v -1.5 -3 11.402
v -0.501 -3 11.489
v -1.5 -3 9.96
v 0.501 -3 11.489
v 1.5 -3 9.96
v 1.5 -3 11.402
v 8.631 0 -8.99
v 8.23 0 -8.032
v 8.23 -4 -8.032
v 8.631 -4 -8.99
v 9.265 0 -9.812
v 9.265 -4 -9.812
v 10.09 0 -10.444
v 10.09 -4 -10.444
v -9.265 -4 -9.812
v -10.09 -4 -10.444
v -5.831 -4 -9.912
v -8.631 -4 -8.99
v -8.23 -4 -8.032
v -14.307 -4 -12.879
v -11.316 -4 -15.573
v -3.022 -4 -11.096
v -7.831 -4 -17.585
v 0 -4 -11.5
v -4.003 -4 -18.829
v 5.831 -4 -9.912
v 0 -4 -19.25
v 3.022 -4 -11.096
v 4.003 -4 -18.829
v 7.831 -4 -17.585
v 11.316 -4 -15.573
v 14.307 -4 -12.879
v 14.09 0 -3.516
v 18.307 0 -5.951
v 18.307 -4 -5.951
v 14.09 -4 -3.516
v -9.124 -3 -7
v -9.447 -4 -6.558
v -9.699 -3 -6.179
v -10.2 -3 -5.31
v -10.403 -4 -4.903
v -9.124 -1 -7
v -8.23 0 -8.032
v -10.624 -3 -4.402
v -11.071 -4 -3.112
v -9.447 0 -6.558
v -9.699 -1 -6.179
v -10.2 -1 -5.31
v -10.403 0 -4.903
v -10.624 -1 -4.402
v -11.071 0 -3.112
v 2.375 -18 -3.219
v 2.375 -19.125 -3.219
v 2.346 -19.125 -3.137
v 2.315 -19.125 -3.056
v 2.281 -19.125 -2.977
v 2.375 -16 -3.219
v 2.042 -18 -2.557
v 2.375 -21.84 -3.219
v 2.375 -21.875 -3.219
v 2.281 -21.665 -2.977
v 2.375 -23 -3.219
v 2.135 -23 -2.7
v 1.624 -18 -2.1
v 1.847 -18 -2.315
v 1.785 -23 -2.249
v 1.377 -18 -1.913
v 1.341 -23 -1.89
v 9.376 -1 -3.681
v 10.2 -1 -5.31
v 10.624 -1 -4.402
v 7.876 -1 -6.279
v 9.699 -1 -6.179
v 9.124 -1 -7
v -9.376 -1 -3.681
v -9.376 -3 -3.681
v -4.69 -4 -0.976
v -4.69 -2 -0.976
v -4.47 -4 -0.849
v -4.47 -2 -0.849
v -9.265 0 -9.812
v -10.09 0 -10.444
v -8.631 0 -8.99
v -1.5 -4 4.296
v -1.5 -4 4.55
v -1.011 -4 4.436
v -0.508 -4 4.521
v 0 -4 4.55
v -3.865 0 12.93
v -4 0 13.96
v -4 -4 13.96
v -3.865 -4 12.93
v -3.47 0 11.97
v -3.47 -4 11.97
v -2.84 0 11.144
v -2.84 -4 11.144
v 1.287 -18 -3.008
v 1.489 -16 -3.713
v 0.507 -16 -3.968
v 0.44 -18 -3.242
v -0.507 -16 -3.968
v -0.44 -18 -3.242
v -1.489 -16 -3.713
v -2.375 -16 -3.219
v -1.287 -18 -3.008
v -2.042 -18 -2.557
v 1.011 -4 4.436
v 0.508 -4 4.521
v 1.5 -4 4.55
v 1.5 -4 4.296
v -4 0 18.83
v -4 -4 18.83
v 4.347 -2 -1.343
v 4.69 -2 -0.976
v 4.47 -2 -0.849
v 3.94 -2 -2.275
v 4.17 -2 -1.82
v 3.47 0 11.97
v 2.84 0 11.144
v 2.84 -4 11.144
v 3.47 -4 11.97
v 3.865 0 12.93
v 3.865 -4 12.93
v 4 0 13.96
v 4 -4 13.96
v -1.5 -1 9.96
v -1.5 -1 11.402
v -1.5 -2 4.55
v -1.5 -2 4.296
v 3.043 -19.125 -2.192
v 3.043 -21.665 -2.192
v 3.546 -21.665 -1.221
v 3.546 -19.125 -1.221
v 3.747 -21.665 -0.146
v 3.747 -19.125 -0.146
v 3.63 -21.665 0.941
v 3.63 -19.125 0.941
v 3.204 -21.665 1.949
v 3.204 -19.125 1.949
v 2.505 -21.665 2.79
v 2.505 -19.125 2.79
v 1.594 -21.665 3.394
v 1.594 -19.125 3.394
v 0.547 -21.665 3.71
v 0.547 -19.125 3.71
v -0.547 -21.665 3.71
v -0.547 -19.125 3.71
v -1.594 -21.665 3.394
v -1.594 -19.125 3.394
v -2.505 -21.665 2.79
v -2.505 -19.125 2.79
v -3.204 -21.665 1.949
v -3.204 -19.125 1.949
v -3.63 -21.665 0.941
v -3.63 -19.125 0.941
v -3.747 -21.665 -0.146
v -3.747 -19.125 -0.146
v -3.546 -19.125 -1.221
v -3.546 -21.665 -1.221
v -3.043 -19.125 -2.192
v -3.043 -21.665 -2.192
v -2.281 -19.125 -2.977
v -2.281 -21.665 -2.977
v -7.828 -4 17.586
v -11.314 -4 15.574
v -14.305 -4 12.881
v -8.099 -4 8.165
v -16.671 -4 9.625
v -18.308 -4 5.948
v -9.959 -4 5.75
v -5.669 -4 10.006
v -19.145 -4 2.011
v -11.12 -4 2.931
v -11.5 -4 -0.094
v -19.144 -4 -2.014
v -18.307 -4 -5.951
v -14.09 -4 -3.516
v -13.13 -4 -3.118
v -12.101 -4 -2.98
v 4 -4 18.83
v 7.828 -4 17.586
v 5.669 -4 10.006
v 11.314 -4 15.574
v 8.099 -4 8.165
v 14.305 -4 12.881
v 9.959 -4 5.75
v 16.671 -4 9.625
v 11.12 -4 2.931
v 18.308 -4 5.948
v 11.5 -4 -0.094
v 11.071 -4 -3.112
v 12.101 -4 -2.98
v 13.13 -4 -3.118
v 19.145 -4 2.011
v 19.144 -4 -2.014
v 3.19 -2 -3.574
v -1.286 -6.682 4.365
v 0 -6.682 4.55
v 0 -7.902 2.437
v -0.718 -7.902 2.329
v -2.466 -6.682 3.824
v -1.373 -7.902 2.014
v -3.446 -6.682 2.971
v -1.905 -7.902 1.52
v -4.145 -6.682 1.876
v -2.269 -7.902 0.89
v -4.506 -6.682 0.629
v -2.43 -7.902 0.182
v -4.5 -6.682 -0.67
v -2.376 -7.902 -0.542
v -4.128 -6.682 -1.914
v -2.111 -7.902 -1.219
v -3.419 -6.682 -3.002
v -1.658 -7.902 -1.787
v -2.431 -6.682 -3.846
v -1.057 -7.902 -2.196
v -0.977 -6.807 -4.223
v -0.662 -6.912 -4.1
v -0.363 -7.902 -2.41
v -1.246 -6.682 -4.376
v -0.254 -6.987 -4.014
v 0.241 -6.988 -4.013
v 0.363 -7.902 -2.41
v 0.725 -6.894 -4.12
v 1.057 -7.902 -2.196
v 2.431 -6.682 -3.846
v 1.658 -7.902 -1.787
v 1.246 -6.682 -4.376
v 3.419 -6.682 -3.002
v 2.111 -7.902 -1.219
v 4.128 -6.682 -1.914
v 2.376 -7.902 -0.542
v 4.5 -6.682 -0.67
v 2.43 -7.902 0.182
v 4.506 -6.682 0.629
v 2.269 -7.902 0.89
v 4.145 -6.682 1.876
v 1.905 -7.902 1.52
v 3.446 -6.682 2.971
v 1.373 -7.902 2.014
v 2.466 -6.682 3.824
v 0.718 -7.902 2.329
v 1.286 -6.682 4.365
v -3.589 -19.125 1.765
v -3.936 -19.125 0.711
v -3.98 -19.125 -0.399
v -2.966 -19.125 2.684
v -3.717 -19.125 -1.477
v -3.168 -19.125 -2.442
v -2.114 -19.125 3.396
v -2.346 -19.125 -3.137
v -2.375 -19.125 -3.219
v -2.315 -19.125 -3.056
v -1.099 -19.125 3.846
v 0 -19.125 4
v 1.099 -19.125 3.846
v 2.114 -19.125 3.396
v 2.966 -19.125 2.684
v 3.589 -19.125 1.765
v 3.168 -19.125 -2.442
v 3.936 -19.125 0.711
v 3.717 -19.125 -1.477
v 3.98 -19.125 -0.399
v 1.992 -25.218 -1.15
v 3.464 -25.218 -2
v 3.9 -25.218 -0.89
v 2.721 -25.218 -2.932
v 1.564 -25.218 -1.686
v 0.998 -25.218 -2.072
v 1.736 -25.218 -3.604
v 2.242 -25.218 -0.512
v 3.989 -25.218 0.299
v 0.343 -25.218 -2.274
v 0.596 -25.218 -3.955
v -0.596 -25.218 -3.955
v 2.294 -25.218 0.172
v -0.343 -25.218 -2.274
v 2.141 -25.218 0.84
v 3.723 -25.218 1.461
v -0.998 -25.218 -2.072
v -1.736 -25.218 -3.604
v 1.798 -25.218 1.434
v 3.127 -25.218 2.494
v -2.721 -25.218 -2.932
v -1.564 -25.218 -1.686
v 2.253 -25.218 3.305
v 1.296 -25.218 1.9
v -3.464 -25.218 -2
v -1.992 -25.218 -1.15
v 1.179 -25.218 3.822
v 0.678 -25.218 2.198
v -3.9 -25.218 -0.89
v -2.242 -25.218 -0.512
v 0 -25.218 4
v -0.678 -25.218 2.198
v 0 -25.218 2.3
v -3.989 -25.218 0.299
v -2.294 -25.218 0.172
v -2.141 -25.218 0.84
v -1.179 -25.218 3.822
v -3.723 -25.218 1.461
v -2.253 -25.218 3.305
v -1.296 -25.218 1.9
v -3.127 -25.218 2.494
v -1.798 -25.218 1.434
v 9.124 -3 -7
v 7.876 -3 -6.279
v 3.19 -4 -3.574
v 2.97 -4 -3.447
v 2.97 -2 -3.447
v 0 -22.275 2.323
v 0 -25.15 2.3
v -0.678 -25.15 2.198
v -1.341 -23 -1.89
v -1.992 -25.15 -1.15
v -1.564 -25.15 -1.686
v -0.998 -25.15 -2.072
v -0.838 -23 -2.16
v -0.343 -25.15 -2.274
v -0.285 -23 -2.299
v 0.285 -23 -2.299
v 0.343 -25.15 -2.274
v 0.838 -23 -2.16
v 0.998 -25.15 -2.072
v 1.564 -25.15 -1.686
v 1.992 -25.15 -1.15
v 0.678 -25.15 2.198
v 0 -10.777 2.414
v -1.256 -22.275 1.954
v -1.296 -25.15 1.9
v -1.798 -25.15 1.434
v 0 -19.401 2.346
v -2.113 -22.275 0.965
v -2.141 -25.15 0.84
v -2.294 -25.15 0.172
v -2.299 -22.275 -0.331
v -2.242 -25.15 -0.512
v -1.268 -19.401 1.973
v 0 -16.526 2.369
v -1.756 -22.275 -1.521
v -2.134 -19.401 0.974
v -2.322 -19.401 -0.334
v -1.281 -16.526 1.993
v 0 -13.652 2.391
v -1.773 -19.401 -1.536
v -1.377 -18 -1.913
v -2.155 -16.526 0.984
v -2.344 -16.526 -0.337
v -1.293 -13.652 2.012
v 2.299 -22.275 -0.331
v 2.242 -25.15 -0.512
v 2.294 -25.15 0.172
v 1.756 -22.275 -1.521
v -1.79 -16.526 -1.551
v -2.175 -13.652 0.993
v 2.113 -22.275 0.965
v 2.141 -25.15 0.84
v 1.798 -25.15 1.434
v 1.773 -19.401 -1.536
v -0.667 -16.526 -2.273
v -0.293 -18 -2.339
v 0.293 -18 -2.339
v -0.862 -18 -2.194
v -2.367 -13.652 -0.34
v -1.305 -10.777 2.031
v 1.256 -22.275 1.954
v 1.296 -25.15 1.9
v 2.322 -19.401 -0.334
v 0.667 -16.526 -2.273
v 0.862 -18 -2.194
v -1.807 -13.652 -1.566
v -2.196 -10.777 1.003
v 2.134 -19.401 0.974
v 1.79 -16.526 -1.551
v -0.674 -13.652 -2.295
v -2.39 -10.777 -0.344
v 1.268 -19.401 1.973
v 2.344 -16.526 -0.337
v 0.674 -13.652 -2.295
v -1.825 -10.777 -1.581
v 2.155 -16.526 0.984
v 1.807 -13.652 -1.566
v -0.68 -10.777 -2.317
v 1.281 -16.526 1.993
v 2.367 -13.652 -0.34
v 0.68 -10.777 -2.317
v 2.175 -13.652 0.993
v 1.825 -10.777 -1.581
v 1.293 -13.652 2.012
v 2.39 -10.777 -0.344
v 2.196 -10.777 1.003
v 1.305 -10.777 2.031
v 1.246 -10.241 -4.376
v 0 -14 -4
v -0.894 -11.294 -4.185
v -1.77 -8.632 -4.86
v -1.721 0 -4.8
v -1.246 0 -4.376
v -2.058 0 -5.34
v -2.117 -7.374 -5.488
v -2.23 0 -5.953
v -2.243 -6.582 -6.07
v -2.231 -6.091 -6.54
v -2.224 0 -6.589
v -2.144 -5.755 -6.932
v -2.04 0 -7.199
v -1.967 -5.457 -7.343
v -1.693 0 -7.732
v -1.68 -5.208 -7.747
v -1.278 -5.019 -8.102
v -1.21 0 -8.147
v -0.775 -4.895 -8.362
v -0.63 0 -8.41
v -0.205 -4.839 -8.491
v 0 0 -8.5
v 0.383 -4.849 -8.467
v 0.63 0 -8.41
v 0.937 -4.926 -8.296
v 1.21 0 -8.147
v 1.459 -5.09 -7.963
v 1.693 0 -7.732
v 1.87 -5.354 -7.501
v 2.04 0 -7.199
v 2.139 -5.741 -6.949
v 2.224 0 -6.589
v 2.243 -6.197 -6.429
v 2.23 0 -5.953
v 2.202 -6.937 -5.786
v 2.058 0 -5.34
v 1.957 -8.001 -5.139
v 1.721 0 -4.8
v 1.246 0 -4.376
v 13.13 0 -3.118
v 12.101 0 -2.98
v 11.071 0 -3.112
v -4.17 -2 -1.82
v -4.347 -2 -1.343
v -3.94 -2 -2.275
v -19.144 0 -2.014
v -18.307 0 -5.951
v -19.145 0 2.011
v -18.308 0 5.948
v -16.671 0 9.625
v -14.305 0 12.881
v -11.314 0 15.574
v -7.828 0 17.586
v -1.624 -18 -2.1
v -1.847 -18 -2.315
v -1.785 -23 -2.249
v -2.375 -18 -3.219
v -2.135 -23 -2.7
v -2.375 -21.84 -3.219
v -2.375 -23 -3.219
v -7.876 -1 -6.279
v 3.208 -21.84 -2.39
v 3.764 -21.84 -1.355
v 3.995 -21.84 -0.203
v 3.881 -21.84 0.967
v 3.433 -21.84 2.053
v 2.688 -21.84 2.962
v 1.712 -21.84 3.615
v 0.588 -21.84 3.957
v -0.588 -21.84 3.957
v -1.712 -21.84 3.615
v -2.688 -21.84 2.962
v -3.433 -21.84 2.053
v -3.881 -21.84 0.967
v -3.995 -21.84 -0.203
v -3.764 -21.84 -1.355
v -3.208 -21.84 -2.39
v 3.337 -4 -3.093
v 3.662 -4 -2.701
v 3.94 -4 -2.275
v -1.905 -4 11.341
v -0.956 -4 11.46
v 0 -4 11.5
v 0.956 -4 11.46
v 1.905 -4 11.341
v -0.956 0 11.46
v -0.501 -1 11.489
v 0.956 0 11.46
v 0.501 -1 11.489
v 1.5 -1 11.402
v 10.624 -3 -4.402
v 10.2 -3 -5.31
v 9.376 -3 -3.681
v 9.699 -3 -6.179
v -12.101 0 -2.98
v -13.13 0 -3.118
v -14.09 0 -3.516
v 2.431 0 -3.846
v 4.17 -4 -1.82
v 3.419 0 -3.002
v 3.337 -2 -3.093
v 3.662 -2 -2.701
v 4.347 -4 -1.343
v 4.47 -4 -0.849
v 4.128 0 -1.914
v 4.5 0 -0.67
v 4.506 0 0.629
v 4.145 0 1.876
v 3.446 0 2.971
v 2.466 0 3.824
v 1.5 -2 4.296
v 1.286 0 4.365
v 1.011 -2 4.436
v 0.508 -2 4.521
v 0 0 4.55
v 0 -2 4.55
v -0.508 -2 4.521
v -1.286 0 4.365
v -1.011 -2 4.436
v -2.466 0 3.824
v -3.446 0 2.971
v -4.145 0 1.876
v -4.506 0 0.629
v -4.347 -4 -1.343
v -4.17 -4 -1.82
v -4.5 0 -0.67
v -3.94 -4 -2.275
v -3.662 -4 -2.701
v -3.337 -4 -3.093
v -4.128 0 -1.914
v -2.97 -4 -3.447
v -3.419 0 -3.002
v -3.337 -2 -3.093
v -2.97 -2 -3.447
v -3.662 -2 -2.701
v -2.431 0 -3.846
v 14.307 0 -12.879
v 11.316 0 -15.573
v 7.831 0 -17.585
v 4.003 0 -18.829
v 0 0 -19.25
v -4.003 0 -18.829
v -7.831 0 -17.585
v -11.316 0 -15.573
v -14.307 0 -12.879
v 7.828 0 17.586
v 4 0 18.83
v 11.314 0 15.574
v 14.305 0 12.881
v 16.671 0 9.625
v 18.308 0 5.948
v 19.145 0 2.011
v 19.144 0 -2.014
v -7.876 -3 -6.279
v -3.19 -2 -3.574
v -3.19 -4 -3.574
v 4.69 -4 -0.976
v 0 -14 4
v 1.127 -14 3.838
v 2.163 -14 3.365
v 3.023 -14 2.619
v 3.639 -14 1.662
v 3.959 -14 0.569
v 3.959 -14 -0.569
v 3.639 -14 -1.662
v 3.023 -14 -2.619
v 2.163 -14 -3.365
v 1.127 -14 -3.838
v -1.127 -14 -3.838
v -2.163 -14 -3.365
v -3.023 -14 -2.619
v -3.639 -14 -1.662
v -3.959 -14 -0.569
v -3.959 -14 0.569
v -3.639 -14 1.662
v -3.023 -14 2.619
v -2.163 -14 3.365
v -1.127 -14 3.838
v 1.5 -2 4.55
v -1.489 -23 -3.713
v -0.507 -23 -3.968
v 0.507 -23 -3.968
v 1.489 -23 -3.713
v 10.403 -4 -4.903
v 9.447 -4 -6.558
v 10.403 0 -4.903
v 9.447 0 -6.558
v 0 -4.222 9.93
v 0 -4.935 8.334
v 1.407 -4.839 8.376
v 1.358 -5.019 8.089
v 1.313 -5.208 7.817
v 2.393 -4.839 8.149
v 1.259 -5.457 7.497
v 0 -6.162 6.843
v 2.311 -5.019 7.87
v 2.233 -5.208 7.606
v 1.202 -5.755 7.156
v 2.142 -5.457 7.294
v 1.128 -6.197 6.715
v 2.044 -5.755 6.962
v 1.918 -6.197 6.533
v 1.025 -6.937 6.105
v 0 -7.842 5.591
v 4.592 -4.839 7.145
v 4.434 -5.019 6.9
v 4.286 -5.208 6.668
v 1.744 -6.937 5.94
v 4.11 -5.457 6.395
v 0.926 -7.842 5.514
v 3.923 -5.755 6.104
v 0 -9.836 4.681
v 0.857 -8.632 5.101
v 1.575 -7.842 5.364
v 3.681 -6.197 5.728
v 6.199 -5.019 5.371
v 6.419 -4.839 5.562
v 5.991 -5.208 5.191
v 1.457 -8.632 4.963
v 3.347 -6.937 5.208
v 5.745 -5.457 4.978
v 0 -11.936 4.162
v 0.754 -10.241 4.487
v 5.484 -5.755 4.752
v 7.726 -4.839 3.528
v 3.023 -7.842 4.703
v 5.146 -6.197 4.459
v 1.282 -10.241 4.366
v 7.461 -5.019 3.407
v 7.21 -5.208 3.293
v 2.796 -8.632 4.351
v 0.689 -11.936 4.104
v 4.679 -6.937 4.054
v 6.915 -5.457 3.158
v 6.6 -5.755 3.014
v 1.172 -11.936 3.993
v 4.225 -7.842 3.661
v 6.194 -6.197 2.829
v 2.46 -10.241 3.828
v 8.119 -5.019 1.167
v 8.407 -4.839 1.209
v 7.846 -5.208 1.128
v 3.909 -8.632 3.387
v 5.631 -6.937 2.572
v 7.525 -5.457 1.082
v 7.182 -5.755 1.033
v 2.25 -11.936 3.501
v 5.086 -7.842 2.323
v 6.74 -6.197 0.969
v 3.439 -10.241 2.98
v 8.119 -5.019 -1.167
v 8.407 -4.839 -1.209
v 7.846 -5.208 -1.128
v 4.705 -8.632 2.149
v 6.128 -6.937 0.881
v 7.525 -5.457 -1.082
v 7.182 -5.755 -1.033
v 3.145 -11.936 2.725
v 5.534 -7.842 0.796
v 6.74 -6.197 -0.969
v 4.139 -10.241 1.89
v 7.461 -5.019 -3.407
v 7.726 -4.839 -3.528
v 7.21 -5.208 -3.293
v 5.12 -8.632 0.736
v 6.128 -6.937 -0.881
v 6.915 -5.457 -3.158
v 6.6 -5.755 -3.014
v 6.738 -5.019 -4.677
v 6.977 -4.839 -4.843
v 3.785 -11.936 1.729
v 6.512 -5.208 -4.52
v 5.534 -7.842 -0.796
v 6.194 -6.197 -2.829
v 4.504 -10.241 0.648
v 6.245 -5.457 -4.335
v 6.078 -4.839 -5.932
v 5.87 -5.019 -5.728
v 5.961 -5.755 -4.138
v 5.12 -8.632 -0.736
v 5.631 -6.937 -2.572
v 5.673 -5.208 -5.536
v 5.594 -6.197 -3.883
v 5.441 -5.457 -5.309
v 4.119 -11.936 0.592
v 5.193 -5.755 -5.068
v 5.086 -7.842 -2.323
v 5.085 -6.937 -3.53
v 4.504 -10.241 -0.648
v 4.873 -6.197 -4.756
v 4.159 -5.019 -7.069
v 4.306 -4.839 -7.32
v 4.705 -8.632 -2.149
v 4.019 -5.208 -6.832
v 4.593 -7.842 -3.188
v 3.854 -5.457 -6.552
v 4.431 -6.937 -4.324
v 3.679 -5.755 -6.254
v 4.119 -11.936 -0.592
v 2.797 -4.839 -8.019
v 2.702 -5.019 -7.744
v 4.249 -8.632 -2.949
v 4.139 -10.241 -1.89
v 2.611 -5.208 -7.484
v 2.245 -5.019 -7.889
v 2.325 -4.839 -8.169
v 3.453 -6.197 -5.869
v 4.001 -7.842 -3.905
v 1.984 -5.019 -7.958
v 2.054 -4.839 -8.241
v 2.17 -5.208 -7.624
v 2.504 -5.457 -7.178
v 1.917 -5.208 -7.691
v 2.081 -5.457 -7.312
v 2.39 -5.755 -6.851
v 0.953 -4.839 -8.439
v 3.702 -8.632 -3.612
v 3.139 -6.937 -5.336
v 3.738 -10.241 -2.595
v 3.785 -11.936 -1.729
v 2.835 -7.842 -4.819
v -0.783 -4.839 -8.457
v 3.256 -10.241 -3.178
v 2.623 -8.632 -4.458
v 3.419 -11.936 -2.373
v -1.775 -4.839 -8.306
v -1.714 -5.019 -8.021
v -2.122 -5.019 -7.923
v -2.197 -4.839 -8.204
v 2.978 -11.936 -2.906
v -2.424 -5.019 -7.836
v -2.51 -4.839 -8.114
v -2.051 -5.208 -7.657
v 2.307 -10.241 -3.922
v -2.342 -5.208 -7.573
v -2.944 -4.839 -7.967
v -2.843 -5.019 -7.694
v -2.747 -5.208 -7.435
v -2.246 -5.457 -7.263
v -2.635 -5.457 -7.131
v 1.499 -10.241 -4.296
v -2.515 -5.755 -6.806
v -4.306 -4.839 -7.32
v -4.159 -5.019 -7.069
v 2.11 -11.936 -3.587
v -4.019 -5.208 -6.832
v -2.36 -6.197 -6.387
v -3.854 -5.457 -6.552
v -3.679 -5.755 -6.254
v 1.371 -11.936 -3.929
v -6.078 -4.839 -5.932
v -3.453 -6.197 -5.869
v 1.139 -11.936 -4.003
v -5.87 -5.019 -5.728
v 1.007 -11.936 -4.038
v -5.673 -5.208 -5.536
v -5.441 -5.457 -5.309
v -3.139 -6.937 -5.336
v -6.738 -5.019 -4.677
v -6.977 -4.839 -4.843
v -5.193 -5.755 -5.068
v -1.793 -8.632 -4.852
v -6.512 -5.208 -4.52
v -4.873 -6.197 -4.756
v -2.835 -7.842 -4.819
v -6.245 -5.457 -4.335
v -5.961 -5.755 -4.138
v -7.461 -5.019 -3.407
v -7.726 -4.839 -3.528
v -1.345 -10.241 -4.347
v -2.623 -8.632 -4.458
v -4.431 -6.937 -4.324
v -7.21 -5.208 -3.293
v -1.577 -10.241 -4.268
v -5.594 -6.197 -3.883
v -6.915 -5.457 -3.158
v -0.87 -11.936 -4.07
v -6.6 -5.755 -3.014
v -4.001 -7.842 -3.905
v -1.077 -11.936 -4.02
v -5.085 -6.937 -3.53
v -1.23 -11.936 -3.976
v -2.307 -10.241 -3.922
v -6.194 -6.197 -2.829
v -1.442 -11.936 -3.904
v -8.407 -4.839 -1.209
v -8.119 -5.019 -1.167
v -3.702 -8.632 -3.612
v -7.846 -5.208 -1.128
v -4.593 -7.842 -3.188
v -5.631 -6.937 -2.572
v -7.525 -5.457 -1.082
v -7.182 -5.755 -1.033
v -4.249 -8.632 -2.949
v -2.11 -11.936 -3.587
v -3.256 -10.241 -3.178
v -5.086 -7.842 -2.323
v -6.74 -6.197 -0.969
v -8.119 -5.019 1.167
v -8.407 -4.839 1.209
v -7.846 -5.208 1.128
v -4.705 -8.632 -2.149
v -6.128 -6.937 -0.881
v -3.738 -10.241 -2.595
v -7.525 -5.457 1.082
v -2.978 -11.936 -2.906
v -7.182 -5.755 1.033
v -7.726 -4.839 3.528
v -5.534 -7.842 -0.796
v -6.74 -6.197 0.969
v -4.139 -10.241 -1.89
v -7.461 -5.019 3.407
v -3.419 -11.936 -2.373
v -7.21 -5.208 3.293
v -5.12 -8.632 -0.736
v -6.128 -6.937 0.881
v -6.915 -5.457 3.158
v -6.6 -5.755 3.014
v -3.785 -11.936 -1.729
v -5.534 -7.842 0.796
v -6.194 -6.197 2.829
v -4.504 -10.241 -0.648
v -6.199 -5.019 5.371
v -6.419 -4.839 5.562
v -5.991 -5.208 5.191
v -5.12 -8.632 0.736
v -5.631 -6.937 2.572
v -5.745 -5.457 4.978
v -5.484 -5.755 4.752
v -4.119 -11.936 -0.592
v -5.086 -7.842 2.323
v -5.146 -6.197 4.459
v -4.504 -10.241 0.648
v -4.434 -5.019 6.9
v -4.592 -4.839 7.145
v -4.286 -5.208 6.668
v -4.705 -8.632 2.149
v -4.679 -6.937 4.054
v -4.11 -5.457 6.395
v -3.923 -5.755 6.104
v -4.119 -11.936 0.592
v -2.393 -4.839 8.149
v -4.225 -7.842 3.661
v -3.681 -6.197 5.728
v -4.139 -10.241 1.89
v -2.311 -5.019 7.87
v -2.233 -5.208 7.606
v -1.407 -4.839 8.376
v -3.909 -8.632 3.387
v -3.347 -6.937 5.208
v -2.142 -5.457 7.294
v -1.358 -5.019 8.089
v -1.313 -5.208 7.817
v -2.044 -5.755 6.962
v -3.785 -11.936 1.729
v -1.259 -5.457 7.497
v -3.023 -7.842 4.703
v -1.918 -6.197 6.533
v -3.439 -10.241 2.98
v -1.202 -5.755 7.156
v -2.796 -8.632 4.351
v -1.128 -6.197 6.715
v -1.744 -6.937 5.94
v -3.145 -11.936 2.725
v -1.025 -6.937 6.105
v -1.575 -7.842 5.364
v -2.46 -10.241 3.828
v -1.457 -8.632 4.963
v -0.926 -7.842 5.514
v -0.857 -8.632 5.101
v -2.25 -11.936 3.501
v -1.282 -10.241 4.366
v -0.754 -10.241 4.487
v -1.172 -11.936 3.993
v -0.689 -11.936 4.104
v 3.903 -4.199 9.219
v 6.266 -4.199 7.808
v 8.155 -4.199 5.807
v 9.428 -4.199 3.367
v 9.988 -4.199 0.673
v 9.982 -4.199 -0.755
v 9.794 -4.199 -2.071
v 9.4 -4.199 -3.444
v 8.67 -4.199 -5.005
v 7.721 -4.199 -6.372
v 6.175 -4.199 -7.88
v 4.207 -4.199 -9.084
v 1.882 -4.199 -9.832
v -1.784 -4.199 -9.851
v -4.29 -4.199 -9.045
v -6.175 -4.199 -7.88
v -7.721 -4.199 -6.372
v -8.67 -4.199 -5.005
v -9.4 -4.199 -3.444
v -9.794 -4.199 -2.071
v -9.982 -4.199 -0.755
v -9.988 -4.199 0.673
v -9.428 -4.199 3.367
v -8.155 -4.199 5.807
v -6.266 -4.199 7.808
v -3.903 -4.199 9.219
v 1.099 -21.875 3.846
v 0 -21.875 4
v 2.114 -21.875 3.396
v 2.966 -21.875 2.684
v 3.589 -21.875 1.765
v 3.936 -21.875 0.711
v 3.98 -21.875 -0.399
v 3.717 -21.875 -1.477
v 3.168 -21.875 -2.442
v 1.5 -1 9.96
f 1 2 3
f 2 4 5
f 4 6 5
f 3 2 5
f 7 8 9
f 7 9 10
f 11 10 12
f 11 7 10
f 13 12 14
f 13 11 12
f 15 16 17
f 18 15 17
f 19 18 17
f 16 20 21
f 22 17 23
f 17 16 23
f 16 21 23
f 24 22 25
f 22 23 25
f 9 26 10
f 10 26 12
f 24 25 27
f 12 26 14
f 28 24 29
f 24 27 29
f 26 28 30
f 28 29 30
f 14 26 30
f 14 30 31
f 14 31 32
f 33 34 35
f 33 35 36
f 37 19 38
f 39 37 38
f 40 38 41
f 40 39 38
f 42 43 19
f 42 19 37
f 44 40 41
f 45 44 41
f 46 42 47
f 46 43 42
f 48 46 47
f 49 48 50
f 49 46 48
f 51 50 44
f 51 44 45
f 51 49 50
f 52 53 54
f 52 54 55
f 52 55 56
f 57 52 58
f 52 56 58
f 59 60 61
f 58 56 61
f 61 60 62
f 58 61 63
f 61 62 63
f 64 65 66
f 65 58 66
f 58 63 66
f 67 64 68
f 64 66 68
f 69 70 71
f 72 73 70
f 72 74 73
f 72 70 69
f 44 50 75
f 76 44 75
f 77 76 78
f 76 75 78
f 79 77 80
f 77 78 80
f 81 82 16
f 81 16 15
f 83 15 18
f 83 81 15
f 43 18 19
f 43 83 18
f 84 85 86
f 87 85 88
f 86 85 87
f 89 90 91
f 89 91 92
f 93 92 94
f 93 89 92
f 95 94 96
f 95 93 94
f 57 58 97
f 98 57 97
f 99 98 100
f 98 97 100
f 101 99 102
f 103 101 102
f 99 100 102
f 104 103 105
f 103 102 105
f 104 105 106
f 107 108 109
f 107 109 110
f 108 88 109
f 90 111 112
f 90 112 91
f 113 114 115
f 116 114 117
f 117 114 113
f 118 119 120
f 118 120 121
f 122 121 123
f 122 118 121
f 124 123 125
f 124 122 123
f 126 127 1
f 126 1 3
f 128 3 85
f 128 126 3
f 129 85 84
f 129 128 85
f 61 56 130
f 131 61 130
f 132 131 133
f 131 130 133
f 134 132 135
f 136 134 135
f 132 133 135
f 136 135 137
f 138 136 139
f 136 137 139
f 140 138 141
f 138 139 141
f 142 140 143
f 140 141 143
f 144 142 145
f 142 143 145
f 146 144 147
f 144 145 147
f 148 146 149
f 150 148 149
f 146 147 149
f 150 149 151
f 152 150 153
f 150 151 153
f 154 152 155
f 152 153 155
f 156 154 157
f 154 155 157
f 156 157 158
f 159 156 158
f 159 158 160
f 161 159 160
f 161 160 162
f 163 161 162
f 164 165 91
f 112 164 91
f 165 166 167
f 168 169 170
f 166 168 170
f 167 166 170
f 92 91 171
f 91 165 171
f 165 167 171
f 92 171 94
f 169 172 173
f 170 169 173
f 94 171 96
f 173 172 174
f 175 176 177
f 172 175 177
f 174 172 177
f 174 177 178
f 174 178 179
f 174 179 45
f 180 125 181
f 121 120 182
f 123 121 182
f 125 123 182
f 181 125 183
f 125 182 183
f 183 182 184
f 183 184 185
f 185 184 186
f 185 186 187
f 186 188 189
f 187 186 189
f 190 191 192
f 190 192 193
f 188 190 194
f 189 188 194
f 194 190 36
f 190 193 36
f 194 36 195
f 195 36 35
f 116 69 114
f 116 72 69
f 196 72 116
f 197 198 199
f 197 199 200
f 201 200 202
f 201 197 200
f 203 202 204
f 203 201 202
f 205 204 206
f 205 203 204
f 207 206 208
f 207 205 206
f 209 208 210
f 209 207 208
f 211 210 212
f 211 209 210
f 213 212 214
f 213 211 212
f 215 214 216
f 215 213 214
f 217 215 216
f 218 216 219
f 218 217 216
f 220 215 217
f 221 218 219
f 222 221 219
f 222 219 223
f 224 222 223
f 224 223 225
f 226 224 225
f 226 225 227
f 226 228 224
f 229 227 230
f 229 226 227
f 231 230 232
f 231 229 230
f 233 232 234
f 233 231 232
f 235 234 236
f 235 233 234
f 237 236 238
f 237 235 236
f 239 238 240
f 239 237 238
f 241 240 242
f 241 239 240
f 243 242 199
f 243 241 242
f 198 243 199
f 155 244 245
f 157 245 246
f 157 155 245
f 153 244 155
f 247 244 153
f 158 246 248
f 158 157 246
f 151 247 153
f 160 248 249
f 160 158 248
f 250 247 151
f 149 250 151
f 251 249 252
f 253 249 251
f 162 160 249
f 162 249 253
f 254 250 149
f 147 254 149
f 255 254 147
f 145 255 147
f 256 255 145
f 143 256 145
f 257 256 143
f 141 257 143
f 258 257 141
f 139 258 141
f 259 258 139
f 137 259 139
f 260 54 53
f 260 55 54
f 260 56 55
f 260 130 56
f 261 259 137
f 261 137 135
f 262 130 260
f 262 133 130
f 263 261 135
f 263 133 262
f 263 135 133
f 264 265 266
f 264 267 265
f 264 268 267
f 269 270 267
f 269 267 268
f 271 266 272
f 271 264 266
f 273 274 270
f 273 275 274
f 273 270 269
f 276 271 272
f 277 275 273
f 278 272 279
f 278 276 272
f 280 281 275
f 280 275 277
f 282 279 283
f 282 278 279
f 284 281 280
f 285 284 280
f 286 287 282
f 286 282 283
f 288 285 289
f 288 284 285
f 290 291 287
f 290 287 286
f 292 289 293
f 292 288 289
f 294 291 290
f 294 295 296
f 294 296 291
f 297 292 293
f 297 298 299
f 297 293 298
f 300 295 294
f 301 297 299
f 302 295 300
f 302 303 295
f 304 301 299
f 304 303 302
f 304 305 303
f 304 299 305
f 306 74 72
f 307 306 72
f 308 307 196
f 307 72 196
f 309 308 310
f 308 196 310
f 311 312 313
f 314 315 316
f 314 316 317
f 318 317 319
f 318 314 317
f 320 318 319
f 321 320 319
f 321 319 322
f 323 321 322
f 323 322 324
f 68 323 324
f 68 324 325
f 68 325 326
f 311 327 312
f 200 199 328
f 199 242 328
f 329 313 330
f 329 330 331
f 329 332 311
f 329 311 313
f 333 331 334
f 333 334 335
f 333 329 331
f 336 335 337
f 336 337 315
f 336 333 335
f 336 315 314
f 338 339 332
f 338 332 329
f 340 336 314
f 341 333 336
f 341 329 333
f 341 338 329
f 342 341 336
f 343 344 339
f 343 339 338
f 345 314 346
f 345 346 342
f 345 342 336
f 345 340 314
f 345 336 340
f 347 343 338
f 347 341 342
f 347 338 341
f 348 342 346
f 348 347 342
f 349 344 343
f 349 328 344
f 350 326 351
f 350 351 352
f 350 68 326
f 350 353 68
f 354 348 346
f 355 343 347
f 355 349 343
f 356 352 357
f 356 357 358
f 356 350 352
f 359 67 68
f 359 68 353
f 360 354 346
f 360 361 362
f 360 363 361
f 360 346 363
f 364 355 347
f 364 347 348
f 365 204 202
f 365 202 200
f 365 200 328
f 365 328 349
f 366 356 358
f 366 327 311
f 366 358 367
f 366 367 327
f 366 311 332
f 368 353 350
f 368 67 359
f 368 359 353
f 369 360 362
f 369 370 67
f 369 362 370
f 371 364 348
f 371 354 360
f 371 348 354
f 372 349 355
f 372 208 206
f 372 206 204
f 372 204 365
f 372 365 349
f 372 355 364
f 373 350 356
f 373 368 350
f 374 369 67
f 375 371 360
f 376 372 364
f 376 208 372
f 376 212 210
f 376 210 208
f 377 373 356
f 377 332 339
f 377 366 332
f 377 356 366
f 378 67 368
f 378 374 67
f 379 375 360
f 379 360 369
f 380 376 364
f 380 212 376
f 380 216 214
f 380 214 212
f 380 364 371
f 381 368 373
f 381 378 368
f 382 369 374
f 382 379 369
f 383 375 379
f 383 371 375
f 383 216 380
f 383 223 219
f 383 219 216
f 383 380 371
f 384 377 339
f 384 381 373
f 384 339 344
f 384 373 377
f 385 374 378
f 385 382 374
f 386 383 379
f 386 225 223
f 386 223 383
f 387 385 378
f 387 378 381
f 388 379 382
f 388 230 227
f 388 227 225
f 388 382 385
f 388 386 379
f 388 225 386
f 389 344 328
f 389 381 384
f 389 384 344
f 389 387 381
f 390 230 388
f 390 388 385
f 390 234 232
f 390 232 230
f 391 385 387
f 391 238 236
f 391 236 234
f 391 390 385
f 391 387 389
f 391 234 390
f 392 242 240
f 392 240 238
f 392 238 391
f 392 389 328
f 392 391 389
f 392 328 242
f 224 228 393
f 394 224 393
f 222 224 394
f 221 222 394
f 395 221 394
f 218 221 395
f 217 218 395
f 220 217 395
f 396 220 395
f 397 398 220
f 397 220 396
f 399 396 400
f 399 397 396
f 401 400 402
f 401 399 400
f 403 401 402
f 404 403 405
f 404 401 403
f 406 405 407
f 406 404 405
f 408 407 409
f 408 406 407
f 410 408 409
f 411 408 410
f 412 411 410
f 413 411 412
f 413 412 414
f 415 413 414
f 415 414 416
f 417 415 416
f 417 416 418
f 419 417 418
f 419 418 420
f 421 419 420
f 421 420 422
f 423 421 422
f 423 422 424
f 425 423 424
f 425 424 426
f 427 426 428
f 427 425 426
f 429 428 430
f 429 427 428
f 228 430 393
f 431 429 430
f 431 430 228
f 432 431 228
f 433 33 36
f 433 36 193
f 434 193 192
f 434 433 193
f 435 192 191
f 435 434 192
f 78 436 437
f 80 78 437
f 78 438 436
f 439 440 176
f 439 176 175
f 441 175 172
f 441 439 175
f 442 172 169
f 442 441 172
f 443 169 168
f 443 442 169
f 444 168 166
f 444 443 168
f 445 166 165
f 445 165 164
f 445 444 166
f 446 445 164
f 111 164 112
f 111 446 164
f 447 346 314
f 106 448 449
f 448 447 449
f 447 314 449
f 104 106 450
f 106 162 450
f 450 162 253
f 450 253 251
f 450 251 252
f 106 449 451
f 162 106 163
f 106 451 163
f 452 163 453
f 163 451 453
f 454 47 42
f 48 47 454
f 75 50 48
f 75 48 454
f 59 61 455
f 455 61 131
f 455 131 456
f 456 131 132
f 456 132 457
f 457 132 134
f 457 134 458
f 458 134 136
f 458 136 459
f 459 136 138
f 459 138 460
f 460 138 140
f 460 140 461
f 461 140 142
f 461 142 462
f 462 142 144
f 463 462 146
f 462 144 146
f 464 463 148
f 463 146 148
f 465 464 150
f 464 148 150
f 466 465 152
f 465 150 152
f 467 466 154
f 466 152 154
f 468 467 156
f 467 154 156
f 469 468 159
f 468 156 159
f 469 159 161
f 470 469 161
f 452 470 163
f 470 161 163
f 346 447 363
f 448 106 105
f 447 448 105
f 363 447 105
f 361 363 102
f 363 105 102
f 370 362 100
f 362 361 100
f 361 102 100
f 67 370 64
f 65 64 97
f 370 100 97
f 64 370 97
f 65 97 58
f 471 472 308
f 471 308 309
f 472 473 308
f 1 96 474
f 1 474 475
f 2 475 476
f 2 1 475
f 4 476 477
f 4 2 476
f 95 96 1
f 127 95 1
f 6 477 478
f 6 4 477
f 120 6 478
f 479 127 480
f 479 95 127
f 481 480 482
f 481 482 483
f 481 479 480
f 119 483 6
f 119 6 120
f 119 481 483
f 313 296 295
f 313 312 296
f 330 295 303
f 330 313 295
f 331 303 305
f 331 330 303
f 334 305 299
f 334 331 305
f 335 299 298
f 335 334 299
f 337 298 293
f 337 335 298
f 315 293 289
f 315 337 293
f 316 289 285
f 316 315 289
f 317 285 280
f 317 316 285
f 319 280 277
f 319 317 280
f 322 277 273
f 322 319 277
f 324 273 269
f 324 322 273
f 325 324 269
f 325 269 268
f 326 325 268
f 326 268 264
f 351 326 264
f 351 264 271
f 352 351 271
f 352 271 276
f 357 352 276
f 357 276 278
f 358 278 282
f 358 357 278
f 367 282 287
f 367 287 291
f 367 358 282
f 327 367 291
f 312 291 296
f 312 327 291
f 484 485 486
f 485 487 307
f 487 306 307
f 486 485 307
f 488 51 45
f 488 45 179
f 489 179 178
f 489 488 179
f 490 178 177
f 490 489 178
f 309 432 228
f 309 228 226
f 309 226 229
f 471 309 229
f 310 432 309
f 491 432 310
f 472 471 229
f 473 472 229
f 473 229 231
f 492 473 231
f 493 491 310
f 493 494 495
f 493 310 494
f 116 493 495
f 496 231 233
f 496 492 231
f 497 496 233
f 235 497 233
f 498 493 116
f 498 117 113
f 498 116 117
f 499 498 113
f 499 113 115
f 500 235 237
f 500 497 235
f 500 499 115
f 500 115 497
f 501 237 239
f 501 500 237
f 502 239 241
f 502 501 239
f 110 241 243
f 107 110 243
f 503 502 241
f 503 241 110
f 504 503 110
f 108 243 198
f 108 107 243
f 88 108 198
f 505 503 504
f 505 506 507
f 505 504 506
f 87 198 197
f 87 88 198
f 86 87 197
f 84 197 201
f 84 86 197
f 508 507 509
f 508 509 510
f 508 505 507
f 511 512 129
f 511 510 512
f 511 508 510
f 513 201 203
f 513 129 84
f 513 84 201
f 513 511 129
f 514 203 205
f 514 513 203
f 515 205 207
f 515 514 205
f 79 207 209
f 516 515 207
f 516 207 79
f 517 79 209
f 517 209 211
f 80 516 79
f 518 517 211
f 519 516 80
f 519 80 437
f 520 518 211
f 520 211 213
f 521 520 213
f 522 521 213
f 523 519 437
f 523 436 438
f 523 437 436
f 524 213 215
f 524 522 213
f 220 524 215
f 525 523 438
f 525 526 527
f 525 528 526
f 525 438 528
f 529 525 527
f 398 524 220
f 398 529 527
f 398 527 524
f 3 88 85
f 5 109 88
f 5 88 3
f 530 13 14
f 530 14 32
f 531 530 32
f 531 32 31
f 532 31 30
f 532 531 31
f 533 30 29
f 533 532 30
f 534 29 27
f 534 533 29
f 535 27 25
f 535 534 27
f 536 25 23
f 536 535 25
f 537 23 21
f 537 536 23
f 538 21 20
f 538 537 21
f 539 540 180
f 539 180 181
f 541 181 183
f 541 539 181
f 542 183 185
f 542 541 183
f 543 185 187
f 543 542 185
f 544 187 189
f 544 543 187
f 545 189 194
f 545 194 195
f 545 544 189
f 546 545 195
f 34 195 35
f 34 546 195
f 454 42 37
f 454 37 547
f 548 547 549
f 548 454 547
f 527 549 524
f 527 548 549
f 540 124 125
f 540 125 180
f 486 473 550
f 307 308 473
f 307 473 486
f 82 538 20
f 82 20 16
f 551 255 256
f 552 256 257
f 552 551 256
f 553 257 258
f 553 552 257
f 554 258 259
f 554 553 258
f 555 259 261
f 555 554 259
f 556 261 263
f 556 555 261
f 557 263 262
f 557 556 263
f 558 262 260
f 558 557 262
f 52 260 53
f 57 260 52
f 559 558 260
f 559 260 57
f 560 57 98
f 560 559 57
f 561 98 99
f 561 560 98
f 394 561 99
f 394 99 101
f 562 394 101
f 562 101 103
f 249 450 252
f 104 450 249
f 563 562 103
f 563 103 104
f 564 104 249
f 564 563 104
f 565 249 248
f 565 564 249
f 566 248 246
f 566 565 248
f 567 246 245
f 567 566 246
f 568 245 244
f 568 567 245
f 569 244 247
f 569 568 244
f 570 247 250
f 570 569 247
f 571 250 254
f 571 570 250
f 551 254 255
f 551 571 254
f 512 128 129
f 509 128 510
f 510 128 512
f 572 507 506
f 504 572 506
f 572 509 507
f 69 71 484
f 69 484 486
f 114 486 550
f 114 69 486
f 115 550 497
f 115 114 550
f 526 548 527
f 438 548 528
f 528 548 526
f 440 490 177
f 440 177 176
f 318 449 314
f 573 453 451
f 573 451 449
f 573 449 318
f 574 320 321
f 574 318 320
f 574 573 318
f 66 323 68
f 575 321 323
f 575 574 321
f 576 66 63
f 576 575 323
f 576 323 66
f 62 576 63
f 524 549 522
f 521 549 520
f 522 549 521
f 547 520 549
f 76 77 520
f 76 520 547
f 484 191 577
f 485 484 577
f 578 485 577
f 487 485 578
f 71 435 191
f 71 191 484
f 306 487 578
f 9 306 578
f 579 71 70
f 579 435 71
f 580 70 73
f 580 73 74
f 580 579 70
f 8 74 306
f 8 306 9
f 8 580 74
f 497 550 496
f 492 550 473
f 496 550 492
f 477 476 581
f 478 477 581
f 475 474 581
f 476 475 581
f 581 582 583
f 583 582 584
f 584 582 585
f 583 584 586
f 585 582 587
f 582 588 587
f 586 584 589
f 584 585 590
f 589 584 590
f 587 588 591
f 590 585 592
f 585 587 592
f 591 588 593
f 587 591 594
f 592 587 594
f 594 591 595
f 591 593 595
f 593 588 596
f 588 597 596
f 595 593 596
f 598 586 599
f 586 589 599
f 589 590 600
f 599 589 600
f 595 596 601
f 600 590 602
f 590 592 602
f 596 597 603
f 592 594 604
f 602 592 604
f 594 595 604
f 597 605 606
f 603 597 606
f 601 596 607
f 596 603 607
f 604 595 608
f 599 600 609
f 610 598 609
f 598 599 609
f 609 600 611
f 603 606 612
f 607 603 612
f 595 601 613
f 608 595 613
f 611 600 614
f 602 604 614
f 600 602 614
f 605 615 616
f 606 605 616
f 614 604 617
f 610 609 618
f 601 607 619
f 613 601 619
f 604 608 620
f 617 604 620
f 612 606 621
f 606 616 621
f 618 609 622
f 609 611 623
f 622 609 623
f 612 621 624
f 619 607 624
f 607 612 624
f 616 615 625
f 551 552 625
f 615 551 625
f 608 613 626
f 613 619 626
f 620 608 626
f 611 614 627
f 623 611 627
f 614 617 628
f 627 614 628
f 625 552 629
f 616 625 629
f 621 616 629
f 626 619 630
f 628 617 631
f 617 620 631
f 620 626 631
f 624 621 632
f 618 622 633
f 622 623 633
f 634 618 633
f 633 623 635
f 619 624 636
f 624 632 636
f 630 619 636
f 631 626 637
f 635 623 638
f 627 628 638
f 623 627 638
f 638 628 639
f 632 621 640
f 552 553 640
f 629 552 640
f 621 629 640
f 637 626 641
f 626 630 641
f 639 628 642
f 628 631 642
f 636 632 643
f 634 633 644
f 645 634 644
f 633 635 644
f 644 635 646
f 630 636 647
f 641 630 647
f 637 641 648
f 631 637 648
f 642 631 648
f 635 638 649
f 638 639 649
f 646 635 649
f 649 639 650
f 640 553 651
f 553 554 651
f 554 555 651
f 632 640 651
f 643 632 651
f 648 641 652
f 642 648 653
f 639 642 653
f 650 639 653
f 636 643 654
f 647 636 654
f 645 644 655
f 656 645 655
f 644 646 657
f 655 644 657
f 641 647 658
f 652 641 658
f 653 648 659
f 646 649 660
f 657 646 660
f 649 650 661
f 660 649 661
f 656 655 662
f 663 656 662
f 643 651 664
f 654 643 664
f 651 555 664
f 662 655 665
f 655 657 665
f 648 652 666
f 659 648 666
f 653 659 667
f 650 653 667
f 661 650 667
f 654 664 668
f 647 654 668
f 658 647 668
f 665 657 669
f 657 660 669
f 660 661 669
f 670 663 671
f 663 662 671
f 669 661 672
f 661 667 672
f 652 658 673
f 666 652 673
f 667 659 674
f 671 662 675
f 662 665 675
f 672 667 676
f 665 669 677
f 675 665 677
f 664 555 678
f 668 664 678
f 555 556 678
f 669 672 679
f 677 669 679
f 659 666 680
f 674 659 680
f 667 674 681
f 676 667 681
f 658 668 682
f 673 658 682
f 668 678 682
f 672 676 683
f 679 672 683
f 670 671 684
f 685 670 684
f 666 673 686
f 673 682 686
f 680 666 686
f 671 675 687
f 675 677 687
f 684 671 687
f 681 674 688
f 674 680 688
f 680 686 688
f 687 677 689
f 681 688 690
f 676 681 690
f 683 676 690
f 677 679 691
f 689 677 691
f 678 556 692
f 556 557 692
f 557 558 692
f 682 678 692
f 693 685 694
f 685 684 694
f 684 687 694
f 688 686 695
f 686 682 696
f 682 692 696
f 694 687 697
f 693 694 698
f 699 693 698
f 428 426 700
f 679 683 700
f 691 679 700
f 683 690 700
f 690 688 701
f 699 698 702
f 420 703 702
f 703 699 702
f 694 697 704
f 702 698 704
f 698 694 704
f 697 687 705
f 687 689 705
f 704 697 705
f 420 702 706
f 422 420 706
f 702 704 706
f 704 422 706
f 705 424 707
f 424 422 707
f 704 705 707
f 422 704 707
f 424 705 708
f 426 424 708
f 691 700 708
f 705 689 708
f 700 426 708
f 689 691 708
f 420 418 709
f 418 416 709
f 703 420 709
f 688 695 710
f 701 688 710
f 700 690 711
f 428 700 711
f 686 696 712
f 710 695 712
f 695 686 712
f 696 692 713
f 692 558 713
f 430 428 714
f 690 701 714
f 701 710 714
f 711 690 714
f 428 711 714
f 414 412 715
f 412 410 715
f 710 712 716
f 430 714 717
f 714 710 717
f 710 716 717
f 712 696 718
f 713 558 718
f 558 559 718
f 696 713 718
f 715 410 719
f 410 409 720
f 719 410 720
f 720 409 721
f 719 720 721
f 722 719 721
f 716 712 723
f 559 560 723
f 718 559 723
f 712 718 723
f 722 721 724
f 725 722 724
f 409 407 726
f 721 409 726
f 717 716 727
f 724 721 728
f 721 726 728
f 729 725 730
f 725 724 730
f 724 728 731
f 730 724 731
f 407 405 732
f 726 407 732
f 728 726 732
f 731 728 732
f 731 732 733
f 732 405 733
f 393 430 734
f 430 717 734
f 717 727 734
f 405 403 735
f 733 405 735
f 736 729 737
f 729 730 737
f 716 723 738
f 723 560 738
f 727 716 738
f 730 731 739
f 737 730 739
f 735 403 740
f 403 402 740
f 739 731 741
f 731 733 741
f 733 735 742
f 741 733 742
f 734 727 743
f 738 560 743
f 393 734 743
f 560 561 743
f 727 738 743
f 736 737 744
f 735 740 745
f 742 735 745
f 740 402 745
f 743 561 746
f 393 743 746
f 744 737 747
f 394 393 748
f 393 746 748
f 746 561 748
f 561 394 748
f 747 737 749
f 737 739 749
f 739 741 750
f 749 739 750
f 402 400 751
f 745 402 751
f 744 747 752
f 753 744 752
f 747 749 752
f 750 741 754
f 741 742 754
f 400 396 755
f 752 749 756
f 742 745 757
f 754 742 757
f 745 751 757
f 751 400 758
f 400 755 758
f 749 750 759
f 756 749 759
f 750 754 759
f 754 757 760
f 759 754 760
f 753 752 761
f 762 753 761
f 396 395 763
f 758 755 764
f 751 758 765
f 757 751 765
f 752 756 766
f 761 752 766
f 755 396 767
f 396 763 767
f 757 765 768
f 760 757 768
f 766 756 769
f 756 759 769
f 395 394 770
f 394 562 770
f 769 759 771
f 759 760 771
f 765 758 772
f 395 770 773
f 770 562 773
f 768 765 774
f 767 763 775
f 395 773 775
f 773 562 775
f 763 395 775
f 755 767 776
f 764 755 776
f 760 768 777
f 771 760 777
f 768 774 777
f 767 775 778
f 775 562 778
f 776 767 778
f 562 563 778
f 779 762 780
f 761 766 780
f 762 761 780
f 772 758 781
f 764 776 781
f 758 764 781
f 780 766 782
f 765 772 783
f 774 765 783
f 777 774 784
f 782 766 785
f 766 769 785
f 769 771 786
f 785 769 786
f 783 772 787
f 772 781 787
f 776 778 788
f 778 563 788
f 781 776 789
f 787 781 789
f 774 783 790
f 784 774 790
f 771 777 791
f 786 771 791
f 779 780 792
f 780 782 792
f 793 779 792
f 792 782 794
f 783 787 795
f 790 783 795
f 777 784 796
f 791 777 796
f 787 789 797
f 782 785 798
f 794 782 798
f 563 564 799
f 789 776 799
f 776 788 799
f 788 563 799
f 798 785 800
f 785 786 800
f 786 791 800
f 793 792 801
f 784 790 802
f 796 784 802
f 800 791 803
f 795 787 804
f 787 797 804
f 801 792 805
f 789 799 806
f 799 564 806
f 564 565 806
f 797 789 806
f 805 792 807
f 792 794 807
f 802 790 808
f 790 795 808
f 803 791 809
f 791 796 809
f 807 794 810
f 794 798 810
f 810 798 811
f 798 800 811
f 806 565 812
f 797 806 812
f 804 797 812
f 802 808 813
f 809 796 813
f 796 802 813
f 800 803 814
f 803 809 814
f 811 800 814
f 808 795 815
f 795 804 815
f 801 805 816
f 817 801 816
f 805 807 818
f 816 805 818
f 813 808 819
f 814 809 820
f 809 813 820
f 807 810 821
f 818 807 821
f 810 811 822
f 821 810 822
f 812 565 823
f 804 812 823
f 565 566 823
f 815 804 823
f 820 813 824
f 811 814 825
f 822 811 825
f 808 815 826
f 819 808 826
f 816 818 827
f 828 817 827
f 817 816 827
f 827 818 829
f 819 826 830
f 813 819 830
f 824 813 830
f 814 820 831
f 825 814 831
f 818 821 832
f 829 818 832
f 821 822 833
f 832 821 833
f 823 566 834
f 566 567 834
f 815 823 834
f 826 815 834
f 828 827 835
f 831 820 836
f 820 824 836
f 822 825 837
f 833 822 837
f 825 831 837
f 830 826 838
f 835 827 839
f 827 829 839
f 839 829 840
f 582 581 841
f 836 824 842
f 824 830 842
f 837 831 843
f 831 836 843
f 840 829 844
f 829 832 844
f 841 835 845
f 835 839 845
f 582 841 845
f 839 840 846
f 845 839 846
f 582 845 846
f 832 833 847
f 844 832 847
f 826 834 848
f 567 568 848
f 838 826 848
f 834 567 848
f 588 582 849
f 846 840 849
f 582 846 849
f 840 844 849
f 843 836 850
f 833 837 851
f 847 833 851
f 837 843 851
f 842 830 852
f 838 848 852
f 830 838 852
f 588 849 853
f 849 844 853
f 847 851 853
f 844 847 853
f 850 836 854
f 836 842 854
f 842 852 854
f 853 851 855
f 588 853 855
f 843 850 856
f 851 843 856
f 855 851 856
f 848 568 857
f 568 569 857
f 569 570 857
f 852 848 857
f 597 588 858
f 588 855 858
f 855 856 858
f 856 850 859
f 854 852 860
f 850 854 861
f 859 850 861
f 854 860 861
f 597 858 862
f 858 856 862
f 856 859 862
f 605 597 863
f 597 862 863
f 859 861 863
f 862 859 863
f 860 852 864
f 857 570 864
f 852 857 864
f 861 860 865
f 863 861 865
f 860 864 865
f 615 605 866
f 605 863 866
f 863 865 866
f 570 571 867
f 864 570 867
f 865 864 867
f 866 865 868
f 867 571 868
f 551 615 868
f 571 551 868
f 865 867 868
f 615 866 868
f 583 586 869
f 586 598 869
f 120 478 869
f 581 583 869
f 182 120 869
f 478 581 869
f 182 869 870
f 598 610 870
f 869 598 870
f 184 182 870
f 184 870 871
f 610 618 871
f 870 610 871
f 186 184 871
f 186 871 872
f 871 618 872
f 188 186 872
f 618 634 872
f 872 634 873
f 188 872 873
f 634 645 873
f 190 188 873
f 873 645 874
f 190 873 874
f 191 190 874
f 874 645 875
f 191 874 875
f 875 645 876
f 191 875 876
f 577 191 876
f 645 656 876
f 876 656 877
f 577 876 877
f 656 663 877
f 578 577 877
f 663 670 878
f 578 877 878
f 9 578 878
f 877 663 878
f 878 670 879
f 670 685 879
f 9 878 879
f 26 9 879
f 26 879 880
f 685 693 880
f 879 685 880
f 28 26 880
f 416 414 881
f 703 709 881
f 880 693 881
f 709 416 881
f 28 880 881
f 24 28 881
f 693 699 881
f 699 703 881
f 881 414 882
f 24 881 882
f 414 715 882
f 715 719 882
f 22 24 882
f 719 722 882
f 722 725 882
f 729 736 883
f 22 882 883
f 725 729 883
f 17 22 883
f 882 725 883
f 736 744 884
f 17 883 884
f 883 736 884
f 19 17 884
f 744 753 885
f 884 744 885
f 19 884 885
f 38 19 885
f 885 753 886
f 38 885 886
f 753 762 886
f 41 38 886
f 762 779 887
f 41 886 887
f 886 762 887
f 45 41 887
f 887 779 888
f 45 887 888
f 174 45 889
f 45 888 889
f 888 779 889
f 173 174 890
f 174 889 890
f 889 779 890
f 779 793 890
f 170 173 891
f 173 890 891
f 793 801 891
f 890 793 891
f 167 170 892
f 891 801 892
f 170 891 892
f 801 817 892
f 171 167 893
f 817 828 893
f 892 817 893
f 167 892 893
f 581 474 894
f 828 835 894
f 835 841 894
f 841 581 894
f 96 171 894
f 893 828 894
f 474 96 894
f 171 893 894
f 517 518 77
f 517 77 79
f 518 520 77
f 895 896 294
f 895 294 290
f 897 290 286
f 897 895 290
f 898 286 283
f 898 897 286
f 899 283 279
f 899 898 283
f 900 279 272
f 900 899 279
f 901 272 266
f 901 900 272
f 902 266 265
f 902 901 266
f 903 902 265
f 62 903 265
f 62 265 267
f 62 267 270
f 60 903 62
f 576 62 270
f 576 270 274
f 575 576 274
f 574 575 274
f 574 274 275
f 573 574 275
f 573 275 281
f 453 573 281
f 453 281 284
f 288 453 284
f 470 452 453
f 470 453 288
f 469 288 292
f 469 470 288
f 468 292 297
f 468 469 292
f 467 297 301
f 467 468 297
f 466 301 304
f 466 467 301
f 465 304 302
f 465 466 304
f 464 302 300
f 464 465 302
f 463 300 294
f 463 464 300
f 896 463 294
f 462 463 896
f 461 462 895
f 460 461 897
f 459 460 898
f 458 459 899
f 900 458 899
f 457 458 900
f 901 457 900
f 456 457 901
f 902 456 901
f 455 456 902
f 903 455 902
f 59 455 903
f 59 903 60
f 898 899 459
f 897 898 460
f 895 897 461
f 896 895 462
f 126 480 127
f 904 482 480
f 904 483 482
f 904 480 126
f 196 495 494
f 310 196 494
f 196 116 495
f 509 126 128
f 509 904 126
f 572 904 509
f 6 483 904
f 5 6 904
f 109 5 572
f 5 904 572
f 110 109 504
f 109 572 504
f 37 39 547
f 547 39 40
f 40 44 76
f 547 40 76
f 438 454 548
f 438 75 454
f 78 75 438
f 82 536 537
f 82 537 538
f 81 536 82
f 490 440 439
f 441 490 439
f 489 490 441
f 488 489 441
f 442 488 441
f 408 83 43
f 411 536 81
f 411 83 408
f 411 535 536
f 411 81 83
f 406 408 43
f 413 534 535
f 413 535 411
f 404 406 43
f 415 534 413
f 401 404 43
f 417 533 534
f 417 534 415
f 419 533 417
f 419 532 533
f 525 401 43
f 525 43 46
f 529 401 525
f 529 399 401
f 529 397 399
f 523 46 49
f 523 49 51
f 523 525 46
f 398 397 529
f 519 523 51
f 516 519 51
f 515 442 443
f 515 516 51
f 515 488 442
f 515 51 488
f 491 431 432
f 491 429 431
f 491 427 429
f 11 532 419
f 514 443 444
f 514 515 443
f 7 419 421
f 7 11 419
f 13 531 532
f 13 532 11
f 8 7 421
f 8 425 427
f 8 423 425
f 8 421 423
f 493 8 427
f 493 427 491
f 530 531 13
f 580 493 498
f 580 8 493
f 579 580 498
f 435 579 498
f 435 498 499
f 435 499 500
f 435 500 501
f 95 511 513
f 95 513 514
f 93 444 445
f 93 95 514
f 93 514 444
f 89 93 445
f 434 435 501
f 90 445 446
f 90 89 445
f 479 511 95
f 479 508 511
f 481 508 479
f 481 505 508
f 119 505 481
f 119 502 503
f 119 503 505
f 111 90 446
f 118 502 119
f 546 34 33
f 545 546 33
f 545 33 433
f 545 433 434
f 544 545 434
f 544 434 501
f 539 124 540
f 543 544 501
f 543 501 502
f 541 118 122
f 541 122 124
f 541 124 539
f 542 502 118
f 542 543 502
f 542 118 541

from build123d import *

# Parameters (mm, degrees)
BOSS_EXTRUDE1_DEPTH     = 4
SKETCH1_4_R             = 4
BOSS_EXTRUDE2_DEPTH     = 27.15
FILLET3_SIZE            = 7.5
FILLET3_SIZE_2          = 10
CUT_EXTRUDE1_START      = -1.932
SKETCH6_R               = 4
SKETCH6_R_2             = 3.356
CUT_EXTRUDE1_DEPTH      = 1.932
SKETCH8_R               = 2.5
CUT_EXTRUDE3_DEPTH      = 5
CHAMFER1_SIZE           = 2
CHAMFER1_SIZE2          = 0.727940469
CUT_EXTRUDE2_DEPTH      = 36.735801376
CUT_EXTRUDE2_DEPTH_BACK = 36.735801376
SKETCH7_R               = 2.25
SKETCH13_W              = 0.25
SKETCH13_H              = 2.75
CHAMFER4_SIZE           = 0.3
CHAMFER4_SIZE_2         = 0.210062261
SKETCH10_W              = 3
SKETCH10_H              = 2
CUT_EXTRUDE15_DEPTH     = 1.5
CIRPATTERN2_COUNT       = 3
CUT_EXTRUDE16_START     = -1.932
SKETCH14_R              = 3.356
SKETCH14_R_2            = 2.3
CUT_EXTRUDE16_DEPTH     = 1.932


with BuildPart() as part:
    # Sketch1 → Boss-Extrude1 (new body)
    with BuildSketch(Plane(origin=(0, 0, 0), x_dir=(1, 0, 0), z_dir=(0, 1, 0))):
        with BuildLine():
            Line((-14.089714637, 3.515898385), (-18.307111179, 5.950813414))
            ThreePointArc((-18.307111179, 5.950813414), (-16.670989023, -9.625), (-4, -18.829830058))
            Line((-4, -18.829830058), (-4, -13.96))
            ThreePointArc((-4, -13.96), (-3.698779414, -12.437163552), (-2.840484577, -11.143681948))
            ThreePointArc((-2.840484577, -11.143681948), (0, -11.5), (2.840484577, -11.143681948))
            ThreePointArc((2.840484577, -11.143681948), (3.698779414, -12.437163552), (4, -13.96))
            Line((4, -13.96), (4, -18.829830058))
            ThreePointArc((4, -18.829830058), (16.670989023, -9.625), (18.307111179, 5.950813414))
            Line((18.307111179, 5.950813414), (14.089714637, 3.515898385))
            ThreePointArc((14.089714637, 3.515898385), (12.620289295, 3.015344841), (11.070953948, 3.111909171))
            ThreePointArc((11.070953948, 3.111909171), (9.959292144, 5.75), (8.230469371, 8.031772777))
            ThreePointArc((8.230469371, 8.031772777), (8.92150988, 9.421818712), (10.089714637, 10.444101615))
            Line((10.089714637, 10.444101615), (14.307111179, 12.879016644))
            ThreePointArc((14.307111179, 12.879016644), (0, 19.25), (-14.307111179, 12.879016644))
            Line((-14.307111179, 12.879016644), (-10.089714637, 10.444101615))
            ThreePointArc((-10.089714637, 10.444101615), (-8.92150988, 9.421818712), (-8.230469371, 8.031772777))
            ThreePointArc((-8.230469371, 8.031772777), (-9.959292144, 5.75), (-11.070953948, 3.111909171))
            ThreePointArc((-11.070953948, 3.111909171), (-12.620289295, 3.015344841), (-14.089714637, 3.515898385))
        make_face()
    extrude(amount=-BOSS_EXTRUDE1_DEPTH)

    # Sketch1<4> → Boss-Extrude2 (add)
    with BuildSketch(Plane(origin=(0, 0, 0), x_dir=(1, 0, 0), z_dir=(0, 1, 0))):
        with Locations(Location((0, 0, 0), (0, 0, 270))):
            Circle(SKETCH1_4_R)
    extrude(amount=-BOSS_EXTRUDE2_DEPTH)

    # Sketch2 → Cut-Revolve4 (revolve, cut)
    with BuildSketch(Plane(origin=(0, 0, 0), x_dir=(0, 0, -1), z_dir=(1, 0, 0)), mode=Mode.PRIVATE) as cut_revolve4_sk:
        Polygon((0, -27.15), (2.3, -27.15), (2.3, -25.15), (2.5, 0), (0, 0), align=None)
    revolve(cut_revolve4_sk.sketch.rotate(Axis((0, 0, 0), (0, -1, 0)), 180), axis=Axis((0, 0, 0), (0, -1, 0)), mode=Mode.SUBTRACT)

    # Fillet3
    # an asymmetric fillet: 10, 7.5 mm, written as the material it adds along each edge
    with BuildSketch(Plane(origin=(0, -4, 0), x_dir=(0, 0, 1), z_dir=(-1, 0, 0))) as fillet3_piece_1_section:
        with BuildLine():
            Bezier((4 + FILLET3_SIZE, 0), (4, 0), (4, -FILLET3_SIZE_2), weights=[1, 0.707106781, 1])
            Line((4, -FILLET3_SIZE_2), (4, 0))
            Line((4, 0), (4 + FILLET3_SIZE, 0))
        make_face()
    fillet3_piece_1 = revolve(axis=Axis((0, -4, 0), (0, 1, 0)), mode=Mode.PRIVATE)
    fillet3_piece_1 = fillet3_piece_1 & Plane(origin=(0, -3.929777006, 0), x_dir=(-0.7156929887401748, 0, -0.6984150240853615), z_dir=(0, 1, 0)) * Cylinder(11.5, 46, mode=Mode.PRIVATE)
    add(fillet3_piece_1)

    # Sketch5 → Cut-Revolve8 (revolve, cut)
    with BuildSketch(Plane.XY, mode=Mode.PRIVATE) as cut_revolve8_sk:
        Polygon((0, -7), (0, -9.309401077), (-4.55, -6.682457352), (-4.55, 0), (-2.55, 0), (-2.55, -5.527756814), align=None)
        Polygon((0, 0), (0, -7), (-2.55, -5.527756814), (-2.55, 0), align=None)
    revolve(cut_revolve8_sk.sketch.rotate(Axis((0, 0, 0), (0, -1, 0)), 270), axis=Axis((0, 0, 0), (0, -1, 0)), mode=Mode.SUBTRACT)

    # Sketch6 → Cut-Extrude1 (cut)
    with BuildSketch(Plane.XZ.offset(27.15).offset(CUT_EXTRUDE1_START)):
        with Locations(Location((0, 0, 0), (0, 0, 90))):
            Circle(SKETCH6_R)
        with Locations(Location((0, 0, 0), (0, 0, 270))):
            Circle(SKETCH6_R_2, mode=Mode.SUBTRACT)
    extrude(amount=CUT_EXTRUDE1_DEPTH, mode=Mode.SUBTRACT)

    # Sketch8 → Cut-Extrude3 (cut)
    with BuildSketch(Plane(origin=(0, -23, 0), x_dir=(1, 0, 0), z_dir=(0, 1, 0))):
        with Locations((0, 4)):
            Circle(SKETCH8_R)
    extrude(amount=CUT_EXTRUDE3_DEPTH, mode=Mode.SUBTRACT)

    # Chamfer1
    chamfer1_edges = [part.edges().sort_by_distance(p)[0] for p in [
        (0, -18, -4),
    ]]
    chamfer1_side = [part.faces().sort_by_distance(p)[0] for p in [
        (0, -19.609, -4),
    ]]
    chamfer(chamfer1_edges, length=CHAMFER1_SIZE, length2=CHAMFER1_SIZE2, reference=chamfer1_side[0])

    # Sketch7 → Cut-Extrude2 (cut, two sides: drawn at the far end of the back side and taken through both)
    with BuildSketch(Plane.XZ.offset(4).offset(-CUT_EXTRUDE2_DEPTH_BACK)):
        with Locations(Location((0, -6.25, 0), (0, 0, 56.387449327))):
            Circle(SKETCH7_R)
    extrude(amount=CUT_EXTRUDE2_DEPTH + CUT_EXTRUDE2_DEPTH_BACK, mode=Mode.SUBTRACT)

    # Sketch13 → Cut-Revolve14 (revolve, cut)
    with BuildSketch(Plane(origin=(0, 0, 0), x_dir=(0, 0, -1), z_dir=(1, 0, 0)), mode=Mode.PRIVATE) as cut_revolve14_sk:
        with Locations((-3.875, -20.5)):
            Rectangle(SKETCH13_W, SKETCH13_H)
    revolve(cut_revolve14_sk.sketch.rotate(Axis((0, -7.902306907, 0), (0, -1, 0)), 216.419913729), axis=Axis((0, -7.902306907, 0), (0, -1, 0)), mode=Mode.SUBTRACT)

    # Chamfer4
    # the kernel refuses this chamfer: 0.3, 0.210062261 mm, written as the material it adds along each edge
    with BuildSketch(Plane(origin=(0, -21.875, 0), x_dir=(0.43172798800380885, 0, -0.9020038494231514), z_dir=(-0.9020038494231514, 0, -0.43172798800380885))) as chamfer4_piece_1_section:
        Polygon((3.75 + CHAMFER4_SIZE, 0), (3.75, -CHAMFER4_SIZE_2 * 1.0000000022), (3.75, 0), align=None)
    chamfer4_piece_1 = revolve(axis=Axis((0, -21.875, 0), (0, -1, 0)), revolution_arc=308.845454641, mode=Mode.PRIVATE)
    chamfer4_piece_1 = chamfer4_piece_1 & Plane(origin=(0, -21.756112084, 0), x_dir=(0, 0, 1), z_dir=(0, 1, 0)) * Cylinder(4, 17, mode=Mode.PRIVATE)
    chamfer4_piece_1 = chamfer4_piece_1 - Plane(origin=(0, -21.756112084, -4), x_dir=(1, 0, 0), z_dir=(0, -1, 0)) * Cylinder(2.5, 17, mode=Mode.PRIVATE)
    add(chamfer4_piece_1)

    # Sketch10 → Cut-Extrude15 (cut, symmetric)
    with BuildSketch(Plane(origin=(0, 0, 0), x_dir=(0, 0, -1), z_dir=(1, 0, 0))):
        with Locations((-11.46, -2)):
            Rectangle(SKETCH10_W, SKETCH10_H)
        Polygon((-4.55, -4), (-9.96, -3), (-9.96, -1), (-4.55, -2), align=None)
        with Locations((-3.05, -3)):
            Rectangle(SKETCH10_W, SKETCH10_H)
    cut_extrude15 = extrude(amount=CUT_EXTRUDE15_DEPTH, both=True, mode=Mode.SUBTRACT)

    # CirPattern2: Cut-Extrude15 ×3 about axis
    cirpattern2_axis = Axis((0, 0, 0), (0, 1, 0))
    for i in range(1, CIRPATTERN2_COUNT):
        add(cut_extrude15.rotate(cirpattern2_axis, i * 360 / CIRPATTERN2_COUNT), mode=Mode.SUBTRACT)

    # Sketch14 → Cut-Extrude16 (cut)
    with BuildSketch(Plane.XZ.offset(27.15).offset(CUT_EXTRUDE16_START)):
        Circle(SKETCH14_R)
        with Locations(Location((0, 0, 0), (0, 0, 90))):
            Circle(SKETCH14_R_2, mode=Mode.SUBTRACT)
    extrude(amount=CUT_EXTRUDE16_DEPTH, mode=Mode.SUBTRACT)


solid = part.part
